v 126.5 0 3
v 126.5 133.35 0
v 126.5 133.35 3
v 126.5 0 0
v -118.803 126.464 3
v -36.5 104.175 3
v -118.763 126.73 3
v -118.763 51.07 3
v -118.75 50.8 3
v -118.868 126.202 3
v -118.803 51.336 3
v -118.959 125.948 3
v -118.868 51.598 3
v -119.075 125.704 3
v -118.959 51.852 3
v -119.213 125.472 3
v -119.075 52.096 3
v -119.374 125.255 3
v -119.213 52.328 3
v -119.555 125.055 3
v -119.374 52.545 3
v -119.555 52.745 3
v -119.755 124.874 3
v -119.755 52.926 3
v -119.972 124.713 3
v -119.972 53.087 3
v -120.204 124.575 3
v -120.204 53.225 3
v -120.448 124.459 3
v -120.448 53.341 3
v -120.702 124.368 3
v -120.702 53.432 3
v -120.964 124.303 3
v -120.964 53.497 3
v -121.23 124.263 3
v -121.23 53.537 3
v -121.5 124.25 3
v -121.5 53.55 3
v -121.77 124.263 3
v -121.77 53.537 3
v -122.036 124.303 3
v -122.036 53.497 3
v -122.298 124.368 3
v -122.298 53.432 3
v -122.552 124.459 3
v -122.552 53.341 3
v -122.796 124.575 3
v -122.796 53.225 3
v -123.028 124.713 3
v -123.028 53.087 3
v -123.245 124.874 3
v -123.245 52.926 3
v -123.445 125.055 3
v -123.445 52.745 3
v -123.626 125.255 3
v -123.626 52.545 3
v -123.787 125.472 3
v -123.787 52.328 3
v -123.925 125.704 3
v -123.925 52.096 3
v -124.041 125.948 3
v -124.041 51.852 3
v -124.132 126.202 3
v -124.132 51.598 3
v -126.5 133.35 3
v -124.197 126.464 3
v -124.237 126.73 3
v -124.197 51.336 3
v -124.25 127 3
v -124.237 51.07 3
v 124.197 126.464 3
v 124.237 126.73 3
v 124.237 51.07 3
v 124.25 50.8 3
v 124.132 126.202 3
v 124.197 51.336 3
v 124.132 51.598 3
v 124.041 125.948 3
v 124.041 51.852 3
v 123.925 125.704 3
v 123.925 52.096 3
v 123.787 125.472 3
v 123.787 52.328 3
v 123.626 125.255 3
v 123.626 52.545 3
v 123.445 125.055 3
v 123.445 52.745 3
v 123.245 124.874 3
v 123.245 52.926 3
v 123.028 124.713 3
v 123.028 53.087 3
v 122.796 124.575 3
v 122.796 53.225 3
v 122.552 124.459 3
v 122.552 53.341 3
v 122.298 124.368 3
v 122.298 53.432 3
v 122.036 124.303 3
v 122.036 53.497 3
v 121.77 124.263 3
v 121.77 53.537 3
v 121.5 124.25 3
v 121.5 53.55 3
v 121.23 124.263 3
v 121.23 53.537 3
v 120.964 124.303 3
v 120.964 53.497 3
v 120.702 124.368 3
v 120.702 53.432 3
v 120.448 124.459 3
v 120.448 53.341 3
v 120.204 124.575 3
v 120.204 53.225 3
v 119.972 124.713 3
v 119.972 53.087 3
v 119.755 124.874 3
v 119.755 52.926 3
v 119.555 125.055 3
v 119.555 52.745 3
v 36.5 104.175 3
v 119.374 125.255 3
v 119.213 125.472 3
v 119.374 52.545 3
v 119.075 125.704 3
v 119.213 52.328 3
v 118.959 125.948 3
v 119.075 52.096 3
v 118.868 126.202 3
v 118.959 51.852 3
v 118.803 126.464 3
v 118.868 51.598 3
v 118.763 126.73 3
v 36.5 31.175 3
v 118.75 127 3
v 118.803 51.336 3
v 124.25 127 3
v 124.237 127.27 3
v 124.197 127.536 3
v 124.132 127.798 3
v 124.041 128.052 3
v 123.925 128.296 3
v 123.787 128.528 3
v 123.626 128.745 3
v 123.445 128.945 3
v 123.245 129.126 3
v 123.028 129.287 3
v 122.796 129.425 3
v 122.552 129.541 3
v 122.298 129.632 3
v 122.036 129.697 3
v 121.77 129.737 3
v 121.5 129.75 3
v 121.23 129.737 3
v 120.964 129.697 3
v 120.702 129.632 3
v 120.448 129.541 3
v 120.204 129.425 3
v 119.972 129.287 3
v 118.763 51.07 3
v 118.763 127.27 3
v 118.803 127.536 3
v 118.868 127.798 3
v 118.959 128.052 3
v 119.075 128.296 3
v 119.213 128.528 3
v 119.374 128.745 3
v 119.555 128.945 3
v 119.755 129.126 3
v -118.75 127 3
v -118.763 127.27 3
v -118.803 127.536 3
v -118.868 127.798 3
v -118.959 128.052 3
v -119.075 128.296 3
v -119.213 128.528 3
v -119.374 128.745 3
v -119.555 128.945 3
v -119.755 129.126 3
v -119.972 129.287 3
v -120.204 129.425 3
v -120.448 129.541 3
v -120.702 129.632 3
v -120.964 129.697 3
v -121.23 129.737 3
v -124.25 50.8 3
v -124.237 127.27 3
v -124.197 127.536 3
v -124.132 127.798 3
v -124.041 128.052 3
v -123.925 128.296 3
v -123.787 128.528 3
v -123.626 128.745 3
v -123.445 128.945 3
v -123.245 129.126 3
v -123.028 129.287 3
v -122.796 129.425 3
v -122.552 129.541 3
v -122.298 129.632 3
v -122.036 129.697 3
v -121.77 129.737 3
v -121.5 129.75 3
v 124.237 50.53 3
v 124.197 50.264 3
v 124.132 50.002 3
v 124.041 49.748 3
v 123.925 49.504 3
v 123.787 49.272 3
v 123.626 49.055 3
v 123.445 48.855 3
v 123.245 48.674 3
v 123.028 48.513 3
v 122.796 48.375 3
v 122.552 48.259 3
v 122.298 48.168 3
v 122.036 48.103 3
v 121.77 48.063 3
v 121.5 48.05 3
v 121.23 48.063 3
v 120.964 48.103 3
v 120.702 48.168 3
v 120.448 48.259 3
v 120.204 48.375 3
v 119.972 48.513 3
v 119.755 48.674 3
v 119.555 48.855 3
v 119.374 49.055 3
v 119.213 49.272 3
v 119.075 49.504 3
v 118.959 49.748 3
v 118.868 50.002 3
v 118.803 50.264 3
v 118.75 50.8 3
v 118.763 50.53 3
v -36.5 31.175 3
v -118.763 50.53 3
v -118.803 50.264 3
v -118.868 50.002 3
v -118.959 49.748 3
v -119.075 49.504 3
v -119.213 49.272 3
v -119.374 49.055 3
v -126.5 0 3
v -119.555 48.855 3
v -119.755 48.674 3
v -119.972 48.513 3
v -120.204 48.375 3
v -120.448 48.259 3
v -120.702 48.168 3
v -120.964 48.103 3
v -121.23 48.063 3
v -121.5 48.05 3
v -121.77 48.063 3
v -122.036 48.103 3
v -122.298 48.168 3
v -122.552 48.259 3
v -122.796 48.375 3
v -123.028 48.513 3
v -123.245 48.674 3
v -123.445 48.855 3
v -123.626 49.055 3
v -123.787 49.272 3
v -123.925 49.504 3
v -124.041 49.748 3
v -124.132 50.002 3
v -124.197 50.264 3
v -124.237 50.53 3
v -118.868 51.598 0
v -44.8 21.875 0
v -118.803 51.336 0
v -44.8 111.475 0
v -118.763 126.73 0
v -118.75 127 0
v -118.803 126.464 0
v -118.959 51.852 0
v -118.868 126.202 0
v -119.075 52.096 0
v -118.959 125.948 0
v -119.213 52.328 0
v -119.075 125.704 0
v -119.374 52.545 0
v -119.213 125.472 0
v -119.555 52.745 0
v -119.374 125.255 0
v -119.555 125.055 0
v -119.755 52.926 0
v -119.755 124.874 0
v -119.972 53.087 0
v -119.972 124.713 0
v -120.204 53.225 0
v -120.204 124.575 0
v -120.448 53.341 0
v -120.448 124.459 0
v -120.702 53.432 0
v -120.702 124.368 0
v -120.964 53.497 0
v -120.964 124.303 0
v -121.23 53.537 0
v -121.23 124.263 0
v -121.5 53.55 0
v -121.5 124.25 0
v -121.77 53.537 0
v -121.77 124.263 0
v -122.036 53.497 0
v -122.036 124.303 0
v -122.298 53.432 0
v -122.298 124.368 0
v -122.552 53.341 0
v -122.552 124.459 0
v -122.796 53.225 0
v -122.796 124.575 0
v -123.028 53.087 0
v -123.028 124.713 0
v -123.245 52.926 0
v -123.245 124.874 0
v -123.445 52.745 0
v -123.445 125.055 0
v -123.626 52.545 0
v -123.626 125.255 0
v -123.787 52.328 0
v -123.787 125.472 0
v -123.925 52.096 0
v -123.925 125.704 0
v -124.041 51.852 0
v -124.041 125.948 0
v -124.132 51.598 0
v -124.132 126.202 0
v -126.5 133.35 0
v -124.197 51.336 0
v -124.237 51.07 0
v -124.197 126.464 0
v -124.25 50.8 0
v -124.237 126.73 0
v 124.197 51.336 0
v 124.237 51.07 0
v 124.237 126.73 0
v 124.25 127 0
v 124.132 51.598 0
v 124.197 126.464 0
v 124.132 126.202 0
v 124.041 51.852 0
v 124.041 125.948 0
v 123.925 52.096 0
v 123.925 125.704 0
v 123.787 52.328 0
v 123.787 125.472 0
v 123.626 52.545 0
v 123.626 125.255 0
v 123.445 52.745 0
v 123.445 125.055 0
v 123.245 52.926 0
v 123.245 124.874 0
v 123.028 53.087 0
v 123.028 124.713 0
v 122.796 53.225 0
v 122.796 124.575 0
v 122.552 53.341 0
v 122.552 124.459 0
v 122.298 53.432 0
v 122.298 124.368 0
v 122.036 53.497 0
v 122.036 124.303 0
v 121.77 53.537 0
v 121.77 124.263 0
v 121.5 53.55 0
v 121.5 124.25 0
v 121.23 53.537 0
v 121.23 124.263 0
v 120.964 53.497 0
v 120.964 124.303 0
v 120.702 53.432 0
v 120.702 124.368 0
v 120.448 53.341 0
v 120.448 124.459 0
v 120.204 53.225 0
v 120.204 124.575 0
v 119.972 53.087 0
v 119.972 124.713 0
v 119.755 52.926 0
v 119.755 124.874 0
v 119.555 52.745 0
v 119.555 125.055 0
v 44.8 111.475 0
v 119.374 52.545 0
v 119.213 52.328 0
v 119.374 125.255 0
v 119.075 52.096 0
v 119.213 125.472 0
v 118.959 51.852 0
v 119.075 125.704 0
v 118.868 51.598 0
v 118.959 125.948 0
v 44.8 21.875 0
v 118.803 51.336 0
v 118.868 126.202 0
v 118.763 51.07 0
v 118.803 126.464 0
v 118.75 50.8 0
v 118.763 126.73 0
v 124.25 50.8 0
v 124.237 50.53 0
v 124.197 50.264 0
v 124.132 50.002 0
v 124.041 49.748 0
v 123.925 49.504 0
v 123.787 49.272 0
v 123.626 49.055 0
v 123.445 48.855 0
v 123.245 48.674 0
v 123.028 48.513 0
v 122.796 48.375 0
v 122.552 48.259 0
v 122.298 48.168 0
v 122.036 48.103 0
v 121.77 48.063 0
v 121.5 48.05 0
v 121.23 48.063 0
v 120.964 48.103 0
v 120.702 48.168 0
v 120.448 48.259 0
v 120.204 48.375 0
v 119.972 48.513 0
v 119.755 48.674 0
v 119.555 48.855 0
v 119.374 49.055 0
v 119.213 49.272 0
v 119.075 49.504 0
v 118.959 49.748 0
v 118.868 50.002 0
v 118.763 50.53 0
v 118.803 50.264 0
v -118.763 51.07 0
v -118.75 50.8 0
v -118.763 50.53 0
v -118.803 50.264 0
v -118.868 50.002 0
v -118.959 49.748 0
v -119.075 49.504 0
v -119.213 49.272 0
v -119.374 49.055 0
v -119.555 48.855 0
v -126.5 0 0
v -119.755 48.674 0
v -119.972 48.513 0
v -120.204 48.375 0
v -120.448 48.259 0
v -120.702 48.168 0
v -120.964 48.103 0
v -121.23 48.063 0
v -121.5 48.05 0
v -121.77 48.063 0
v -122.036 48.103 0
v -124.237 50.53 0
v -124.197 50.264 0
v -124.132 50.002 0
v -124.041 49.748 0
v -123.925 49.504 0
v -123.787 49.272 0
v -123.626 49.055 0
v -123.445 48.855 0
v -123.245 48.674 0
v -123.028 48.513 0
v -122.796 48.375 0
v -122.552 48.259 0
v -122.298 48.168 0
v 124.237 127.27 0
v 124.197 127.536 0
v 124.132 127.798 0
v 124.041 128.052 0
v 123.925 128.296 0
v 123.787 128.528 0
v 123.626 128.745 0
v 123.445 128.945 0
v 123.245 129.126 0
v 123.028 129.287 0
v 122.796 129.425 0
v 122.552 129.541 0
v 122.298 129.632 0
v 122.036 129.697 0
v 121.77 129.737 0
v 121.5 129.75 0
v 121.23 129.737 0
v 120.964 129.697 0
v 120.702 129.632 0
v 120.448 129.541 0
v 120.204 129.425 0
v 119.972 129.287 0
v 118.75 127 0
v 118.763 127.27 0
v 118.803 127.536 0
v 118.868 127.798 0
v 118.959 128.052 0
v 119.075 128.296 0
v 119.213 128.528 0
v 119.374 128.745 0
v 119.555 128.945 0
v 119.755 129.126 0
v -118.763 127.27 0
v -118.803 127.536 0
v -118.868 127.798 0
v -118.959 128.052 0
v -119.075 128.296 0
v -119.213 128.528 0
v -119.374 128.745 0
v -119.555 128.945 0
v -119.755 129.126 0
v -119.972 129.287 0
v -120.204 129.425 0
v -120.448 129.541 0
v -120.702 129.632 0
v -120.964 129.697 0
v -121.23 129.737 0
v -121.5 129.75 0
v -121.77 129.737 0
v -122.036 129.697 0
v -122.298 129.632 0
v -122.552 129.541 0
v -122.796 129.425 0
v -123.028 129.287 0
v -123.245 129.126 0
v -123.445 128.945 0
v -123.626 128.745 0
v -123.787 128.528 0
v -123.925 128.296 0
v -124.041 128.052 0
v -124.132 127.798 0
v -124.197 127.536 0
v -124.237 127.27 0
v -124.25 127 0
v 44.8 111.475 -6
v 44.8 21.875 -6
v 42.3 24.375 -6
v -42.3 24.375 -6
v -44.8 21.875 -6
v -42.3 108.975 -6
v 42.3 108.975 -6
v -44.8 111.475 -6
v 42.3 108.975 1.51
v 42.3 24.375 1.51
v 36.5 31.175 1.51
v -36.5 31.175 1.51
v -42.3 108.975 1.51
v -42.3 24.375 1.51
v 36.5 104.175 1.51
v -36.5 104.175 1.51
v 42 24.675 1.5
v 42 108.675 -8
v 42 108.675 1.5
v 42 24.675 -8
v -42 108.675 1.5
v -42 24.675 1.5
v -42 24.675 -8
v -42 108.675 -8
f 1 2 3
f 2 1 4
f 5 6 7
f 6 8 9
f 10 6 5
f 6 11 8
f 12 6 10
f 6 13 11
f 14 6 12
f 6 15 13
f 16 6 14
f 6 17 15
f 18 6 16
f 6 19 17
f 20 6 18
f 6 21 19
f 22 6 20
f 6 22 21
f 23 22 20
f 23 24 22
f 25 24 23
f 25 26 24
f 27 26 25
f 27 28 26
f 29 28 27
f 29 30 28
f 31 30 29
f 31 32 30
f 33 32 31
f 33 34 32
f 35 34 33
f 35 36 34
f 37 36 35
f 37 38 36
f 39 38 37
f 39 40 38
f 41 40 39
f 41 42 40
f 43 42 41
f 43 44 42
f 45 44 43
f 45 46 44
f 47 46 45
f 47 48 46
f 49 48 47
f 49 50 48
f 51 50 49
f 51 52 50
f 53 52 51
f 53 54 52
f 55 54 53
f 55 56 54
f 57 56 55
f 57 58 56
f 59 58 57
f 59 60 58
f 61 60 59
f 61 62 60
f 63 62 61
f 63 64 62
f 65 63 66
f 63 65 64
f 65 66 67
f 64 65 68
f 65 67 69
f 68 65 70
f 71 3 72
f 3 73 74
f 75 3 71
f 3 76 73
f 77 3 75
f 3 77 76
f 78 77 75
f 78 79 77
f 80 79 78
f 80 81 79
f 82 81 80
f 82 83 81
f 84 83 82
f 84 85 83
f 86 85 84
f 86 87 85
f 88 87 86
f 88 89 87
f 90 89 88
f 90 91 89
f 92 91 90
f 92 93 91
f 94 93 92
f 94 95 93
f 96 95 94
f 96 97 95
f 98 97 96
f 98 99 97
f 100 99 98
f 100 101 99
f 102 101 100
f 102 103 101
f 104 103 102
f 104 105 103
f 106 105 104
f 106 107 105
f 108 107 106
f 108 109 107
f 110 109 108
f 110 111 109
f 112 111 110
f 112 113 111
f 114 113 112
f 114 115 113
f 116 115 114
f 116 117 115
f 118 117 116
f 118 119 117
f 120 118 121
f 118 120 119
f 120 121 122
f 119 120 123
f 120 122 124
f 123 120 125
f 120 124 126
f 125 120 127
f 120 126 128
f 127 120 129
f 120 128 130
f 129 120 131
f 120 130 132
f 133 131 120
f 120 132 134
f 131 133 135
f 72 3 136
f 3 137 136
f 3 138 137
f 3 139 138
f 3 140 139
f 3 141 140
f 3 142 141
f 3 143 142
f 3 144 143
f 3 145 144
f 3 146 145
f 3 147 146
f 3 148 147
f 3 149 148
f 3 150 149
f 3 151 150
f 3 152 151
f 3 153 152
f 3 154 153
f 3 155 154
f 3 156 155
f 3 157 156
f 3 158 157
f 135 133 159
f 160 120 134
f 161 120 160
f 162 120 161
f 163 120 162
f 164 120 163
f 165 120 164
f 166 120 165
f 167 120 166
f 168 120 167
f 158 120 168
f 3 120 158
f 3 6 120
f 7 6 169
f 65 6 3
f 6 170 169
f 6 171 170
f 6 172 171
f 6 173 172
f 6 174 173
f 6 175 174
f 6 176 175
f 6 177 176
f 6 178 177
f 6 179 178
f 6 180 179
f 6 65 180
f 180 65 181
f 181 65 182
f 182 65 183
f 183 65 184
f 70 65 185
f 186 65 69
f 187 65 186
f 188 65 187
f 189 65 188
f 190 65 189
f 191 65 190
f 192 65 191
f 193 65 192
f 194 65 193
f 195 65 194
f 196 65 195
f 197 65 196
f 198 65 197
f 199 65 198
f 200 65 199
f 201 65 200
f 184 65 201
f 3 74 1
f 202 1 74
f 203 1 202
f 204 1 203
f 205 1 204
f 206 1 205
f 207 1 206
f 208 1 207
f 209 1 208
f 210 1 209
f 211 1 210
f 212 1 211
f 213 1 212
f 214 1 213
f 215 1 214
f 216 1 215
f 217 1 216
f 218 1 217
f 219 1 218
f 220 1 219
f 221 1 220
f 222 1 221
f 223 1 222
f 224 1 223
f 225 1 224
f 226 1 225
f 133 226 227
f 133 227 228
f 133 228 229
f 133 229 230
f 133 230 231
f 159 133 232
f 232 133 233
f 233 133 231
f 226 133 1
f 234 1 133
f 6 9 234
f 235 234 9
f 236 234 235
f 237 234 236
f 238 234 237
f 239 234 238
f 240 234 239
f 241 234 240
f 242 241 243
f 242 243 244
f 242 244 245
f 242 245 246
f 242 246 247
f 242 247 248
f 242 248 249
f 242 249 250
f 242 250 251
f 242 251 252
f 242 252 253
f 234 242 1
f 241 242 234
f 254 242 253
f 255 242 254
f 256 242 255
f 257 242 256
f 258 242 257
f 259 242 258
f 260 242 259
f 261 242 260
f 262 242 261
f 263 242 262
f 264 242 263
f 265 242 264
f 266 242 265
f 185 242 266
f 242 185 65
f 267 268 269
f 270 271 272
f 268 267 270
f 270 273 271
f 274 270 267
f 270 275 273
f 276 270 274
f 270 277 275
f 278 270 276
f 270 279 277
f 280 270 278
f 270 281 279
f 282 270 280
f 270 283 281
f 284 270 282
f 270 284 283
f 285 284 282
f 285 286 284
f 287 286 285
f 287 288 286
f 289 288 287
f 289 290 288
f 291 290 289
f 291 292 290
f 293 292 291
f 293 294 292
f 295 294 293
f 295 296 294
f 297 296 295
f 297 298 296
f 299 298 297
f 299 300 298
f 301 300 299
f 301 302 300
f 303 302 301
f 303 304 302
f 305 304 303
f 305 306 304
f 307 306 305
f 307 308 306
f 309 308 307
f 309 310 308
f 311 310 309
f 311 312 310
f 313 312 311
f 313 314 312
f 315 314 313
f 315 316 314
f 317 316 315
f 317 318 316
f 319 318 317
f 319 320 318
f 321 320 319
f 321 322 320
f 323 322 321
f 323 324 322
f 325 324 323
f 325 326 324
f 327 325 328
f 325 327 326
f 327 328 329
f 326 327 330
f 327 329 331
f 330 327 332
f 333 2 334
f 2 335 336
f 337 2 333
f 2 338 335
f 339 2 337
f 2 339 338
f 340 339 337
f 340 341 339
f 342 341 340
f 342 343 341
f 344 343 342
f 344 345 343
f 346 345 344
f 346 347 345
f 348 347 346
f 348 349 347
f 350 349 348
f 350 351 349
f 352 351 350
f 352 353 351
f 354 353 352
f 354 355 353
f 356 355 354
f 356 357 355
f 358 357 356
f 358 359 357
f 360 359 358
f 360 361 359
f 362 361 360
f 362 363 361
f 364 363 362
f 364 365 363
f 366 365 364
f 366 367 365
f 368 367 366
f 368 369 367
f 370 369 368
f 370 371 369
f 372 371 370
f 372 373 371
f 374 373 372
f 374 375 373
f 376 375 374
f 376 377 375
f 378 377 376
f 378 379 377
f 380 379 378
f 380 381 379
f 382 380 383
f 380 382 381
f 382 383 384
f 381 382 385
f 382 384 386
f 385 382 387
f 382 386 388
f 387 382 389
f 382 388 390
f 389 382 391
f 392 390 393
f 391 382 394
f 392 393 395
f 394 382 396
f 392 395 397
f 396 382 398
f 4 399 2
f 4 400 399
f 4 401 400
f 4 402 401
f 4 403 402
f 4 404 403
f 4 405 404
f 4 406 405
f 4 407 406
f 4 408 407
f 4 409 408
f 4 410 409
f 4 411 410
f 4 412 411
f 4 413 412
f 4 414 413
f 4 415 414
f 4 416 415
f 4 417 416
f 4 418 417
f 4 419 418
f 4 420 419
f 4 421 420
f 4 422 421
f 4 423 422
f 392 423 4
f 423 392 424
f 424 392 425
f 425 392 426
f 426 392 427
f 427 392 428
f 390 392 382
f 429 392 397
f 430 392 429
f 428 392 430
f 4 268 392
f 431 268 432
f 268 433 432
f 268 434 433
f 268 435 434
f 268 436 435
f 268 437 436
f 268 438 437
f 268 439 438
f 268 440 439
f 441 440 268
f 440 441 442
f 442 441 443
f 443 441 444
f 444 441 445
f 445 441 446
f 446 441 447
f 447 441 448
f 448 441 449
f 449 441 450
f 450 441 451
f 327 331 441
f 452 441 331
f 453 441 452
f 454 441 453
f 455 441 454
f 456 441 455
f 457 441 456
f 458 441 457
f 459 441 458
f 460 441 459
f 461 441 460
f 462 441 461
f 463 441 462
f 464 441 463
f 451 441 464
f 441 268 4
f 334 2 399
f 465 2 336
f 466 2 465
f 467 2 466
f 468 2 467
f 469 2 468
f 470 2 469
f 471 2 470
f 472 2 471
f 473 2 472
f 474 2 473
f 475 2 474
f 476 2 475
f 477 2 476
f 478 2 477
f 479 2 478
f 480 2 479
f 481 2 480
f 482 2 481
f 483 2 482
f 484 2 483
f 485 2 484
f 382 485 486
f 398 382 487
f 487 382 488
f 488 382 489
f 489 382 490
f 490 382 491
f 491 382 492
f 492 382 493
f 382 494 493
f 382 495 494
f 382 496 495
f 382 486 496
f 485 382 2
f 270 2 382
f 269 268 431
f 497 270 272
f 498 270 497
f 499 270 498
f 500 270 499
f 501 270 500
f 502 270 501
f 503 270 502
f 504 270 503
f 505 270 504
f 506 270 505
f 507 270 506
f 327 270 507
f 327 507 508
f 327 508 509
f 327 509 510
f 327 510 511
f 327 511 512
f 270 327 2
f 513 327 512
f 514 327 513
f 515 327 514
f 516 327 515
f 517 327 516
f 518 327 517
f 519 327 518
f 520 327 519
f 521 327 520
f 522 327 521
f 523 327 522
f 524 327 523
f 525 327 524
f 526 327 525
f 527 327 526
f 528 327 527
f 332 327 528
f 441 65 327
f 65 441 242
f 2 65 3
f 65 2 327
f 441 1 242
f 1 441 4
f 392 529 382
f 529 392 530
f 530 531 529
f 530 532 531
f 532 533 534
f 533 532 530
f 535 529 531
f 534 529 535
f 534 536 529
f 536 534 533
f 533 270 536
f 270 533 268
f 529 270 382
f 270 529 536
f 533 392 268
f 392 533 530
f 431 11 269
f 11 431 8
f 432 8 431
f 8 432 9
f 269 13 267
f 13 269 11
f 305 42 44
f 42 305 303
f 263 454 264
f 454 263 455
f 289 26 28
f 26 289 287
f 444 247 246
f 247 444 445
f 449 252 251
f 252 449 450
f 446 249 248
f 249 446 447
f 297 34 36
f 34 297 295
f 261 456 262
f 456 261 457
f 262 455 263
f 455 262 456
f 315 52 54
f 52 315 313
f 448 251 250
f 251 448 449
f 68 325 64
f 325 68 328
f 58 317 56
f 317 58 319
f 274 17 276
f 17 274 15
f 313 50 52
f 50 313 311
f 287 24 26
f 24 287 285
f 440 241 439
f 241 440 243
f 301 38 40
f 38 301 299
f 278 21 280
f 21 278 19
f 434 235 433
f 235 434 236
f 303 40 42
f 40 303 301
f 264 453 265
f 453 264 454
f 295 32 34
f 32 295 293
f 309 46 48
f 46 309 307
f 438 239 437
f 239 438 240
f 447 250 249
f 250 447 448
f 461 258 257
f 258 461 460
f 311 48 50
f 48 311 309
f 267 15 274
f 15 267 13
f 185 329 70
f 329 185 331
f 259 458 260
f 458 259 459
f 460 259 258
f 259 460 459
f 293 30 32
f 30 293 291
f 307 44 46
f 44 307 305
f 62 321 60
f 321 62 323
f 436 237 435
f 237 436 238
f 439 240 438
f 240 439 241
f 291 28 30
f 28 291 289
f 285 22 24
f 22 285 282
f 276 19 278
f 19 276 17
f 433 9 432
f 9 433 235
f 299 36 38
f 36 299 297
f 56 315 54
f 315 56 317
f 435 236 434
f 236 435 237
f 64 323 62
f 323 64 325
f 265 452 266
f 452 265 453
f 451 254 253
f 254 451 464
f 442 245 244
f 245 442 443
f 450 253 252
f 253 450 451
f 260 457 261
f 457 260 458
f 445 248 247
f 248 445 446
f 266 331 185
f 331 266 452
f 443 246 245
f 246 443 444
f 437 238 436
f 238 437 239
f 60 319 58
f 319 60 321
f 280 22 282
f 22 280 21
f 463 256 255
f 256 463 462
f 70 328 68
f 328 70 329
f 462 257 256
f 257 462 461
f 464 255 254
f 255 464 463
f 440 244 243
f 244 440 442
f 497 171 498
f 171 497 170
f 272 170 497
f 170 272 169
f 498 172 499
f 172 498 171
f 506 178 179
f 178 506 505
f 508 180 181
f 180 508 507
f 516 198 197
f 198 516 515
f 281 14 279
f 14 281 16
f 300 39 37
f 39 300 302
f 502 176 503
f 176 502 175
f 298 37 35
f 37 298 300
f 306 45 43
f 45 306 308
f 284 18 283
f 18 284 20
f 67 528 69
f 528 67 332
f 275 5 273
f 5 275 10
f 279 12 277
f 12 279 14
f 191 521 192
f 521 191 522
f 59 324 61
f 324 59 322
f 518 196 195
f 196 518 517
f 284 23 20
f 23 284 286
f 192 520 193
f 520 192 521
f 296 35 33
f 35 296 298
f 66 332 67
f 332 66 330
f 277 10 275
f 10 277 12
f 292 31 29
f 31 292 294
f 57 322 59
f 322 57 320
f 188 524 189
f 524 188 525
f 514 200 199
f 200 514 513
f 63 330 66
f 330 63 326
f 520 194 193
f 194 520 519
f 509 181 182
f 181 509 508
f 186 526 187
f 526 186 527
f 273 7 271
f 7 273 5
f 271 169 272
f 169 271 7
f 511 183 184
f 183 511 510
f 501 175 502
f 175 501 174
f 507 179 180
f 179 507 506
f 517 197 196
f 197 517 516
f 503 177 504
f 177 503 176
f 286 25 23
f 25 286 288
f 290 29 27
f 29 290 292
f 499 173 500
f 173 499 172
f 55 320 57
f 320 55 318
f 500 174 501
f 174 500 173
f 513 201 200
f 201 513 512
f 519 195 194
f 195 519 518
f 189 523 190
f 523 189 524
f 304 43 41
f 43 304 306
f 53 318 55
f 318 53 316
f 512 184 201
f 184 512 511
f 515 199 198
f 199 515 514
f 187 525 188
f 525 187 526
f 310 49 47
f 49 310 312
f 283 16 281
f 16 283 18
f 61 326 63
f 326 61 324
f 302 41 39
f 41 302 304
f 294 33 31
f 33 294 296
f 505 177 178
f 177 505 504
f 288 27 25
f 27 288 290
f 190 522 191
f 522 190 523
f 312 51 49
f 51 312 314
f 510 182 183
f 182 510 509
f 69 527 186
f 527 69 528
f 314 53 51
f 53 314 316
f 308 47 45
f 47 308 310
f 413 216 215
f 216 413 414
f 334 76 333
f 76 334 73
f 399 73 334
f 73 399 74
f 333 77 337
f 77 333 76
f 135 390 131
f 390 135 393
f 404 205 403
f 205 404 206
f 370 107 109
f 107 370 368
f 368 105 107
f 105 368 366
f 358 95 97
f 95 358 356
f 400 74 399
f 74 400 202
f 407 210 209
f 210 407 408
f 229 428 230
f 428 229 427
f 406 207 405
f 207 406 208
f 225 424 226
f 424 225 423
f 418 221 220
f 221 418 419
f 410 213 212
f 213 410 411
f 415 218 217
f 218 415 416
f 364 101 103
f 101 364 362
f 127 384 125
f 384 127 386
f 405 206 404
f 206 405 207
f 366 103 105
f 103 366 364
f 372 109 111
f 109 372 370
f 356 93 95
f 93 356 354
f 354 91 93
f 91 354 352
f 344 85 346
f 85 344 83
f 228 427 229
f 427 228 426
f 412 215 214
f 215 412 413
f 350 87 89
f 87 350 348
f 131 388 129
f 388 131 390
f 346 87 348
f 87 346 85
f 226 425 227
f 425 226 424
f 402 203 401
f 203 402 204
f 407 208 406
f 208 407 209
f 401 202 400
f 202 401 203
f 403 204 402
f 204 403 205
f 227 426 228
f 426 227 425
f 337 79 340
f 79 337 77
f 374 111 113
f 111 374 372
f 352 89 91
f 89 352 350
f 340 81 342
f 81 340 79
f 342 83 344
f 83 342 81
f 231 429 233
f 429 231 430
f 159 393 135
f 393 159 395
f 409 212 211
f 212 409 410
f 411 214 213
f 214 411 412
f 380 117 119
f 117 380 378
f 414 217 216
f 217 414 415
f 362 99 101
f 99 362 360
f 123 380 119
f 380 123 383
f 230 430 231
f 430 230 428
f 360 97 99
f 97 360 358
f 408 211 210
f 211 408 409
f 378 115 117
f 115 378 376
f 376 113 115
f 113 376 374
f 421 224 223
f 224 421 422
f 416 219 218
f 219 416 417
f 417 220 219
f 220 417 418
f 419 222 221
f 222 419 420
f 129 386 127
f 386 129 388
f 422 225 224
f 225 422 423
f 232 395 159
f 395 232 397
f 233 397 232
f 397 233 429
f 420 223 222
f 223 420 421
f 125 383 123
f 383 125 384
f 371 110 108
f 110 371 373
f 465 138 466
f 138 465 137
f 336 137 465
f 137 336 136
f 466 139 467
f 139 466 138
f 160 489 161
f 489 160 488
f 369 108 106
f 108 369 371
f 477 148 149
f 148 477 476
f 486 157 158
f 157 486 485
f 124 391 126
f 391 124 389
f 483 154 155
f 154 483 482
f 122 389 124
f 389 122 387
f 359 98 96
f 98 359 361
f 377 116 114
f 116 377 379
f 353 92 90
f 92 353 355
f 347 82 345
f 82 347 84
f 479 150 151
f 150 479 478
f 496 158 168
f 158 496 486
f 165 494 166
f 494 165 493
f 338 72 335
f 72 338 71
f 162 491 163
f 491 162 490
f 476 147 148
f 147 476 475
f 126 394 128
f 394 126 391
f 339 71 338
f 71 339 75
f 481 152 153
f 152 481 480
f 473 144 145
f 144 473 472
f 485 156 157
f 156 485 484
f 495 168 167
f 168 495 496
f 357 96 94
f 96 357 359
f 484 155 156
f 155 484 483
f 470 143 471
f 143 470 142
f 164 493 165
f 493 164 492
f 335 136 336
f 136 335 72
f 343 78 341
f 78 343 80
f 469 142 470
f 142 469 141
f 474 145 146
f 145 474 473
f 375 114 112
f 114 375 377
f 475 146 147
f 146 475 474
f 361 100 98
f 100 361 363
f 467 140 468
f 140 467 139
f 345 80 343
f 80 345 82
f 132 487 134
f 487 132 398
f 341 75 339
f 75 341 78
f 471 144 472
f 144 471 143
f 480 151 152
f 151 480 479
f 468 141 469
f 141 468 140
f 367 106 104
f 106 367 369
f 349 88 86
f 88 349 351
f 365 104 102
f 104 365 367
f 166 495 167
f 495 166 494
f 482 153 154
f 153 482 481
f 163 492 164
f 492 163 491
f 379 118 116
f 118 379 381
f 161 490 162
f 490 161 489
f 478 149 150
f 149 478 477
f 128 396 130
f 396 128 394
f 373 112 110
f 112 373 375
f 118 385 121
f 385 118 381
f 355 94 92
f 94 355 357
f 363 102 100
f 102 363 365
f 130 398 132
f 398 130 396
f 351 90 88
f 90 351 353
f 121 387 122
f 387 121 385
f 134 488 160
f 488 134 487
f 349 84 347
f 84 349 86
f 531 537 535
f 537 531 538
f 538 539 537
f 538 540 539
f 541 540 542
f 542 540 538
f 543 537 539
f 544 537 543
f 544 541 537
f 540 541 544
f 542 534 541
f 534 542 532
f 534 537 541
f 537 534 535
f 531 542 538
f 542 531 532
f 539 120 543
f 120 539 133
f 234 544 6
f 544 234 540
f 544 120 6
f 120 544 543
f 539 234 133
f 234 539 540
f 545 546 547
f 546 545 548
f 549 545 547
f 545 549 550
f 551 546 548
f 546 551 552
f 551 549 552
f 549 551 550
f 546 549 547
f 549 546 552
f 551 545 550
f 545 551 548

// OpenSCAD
// =============================================================================
// CONSOLE10 — HyperPixel 4.0 Square Faceplate  v0.1  (3 mm flat panel, 3U)
//
// For the Pimoroni HyperPixel 4.0 SQUARE *Touch* (720x720 IPS, capacitive).
// The Pi is OFF-PANEL (connected by ribbon) — this plate holds the DISPLAY ONLY.
//
// DESIGN: uniform 3 mm flat faceplate that bolts to the cheek SLANT inserts
// (same family as Console10_display_faceplate / _lcd_simple_faceplate). The
// square display drops into a RECESSED FRONT POCKET from the back; a front LIP
// frames the active area and overlaps the ~6 mm black bezel margin to capture
// the glass. A rear LOCATING COLLAR (open square tube) surrounds the board edges
// behind the plate to locate it and host retention (clips/screws — v0.2).
//
// Local frame (also the print orientation):
//   X = plate width,  Y = up the plate (= up the cheek slant),  Z = thickness.
//   +Z = front / operator side.  Front face at Z = plate_t, back at Z = 0.
//
// DIMENSIONS — CONFIRMED from the Pimoroni HyperPixel 4.0 Square mechanical
// drawing (2026-06-11). Items marked [CAL] still want a caliper pass before a
// final print.
//   hp_board   84.0   board W=H (touch; non-touch is 75x80). CONFIRMED
//   hp_active  72.0    active display W=H. CONFIRMED
//   hp_depth   9.5     glass front -> back of header. CONFIRMED
//   hp_rim_t   2.6     glass+PCB edge the lip/collar bears on. [CAL]
//   Bezel ~5.5 L/R, 4.5 top, 6.5 bottom (approx) -> active is NOT centered; it
//   sits ~1 mm toward the GPIO-header edge (see active_off_y). [CAL]
//   HAT holes: 58 x 49 grid, upper-left at (4.0, 6.5) from the board top-left,
//   M2.5 (forum reply, not datasheet) [CAL]. CONFIRMED CATCH: the right-hand
//   hole column lands INSIDE the 72 active glass -> no front bolt -> rear
//   retention (v0.2). The official GrabCAD/STEP link is dead as of 2026.
// =============================================================================

// ---------- module geometry the plate must mate to ----------
panel_width   = 253;      // 10" mini-rack width
cheek_thick   = 10;
slant_angle   = 30;       // front slant, degrees from vertical
U             = 44.45;    // 1U, mm
interior_half = panel_width/2 - cheek_thick;   // 116.5
cheek_ctr_x   = interior_half + cheek_thick/2; // 121.5 (slant insert X centerline)

// ---------- flat plate ----------
n_u      = 3;             // 3U faceplate
plate_w  = 253;           // sides flush with the cheek outer faces (+/-126.5)
plate_h  = n_u * U;       // 133.35
plate_t  = 3;             // uniform panel thickness

// ---------- HyperPixel 4.0 Square Touch — CONFIRMED (Pimoroni mech drawing) ---
hp_board  = 84.0;         // board W = H (square, touch). CONFIRMED
hp_active = 72.0;         // active display W = H. CONFIRMED
hp_depth  = 9.5;          // glass front -> back of header. CONFIRMED
hp_rim_t  = 4.6;          // glass+PCB rim thickness under the lip. MEASURED 4.6

// Asymmetric bezel -> the active is offset toward the header edge. SIGN below
// assumes the GPIO-header edge is at the TOP of the plate (header-up); negate
// active_off_y if you mount it header-down.
bezel_top    = 4.5;       // [CAL]
bezel_bottom = 6.5;       // [CAL]
active_off_y = (bezel_bottom - bezel_top) / 2;   // +1.0 mm toward header  [CAL]

// ---------- HAT mounting holes — DOCUMENTED ONLY (not cut; under the glass) ---
// 58 x 49 grid; upper-left hole 4.0 from left / 6.5 from top of the 84 board.
hole_ul = [4.0, 6.5];     // upper-left hole from board top-left, M2.5  [CAL]
hole_dx = 58;  hole_dy = 49;
hole_xs = [-hp_board/2 + hole_ul[0], -hp_board/2 + hole_ul[0] + hole_dx]; // [-38, 20]
hole_ys = [ hp_board/2 - hole_ul[1],  hp_board/2 - hole_ul[1] - hole_dy]; // [35.5, -13.5]
hole_d  = 2.7;            // M2.5 clearance (reference marker only)

// ---------- front frame (pocket + lip + window) ----------
board_clr  = 0.3;                      // per-side clearance, board into the pocket
pocket     = hp_board + 2*board_clr;   // 84.6 — board cavity W = H
win_reveal = 0.5;                      // bezel reveal per side around the active
window     = hp_active + 2*win_reveal; // 73.0 — viewing aperture (frames active)
lip_t      = 1.5;                      // front frame thickness over the bezel

// ---------- rear locating collar (open square tube behind the plate) ----------
collar_h    = 6;          // wall height behind the plate (locates the board edges)
collar_wall = 2.5;        // wall thickness
collar_out  = pocket + 2*collar_wall;  // 89.6 outer

// ---------- v0.2 rear retention clips (reuse the print-TESTED Stream Deck Mini
// pattern). Flex fingers cut from the collar SIDE walls; an inward hook snaps
// over the board's MEASURED 4.6 mm-thick back edge to press the glass into the
// lip. SIDE edges only -> clears the GPIO header (top edge) + the FPC corner.
// NOTE: short fingers (collar only 6 mm) -> stiff snap; fit-test coupon first.
retention   = true;
clip_w      = 8;          // flex-finger width along the edge (Y)
clip_slot   = 1.2;        // slot width isolating each finger (flex gap)
hook_d      = 1.3;        // hook overhang past the cavity wall (~1.0 mm board grab)
hook_h      = 1.5;        // hook catch height (Z)
clip_ys_off = [-20, 20];  // finger Y = cy + these; avoid header/FPC  [CHECK FPC]

// ---------- placement ----------
cx = 0;
cy = plate_h/2;           // centered vertically on the 3U plate

// ---------- slant-insert mount holes (perpendicular through the flat plate) ----
mount_y      = [50.80, 127.00];
m10_32_clear = 5.5;       // 10-32 clearance

show_screen   = true;     // include the mock display in the fit-check
show_holes    = false;    // red markers at the 4 HAT holes (shows them vs glass)
show_on_slant = false;    // true = tilt the flat stack onto the 30 deg slant
floor_t       = 6;        // bottom-panel slab thickness (for the slant placement)

$fn = 64;

echo(str("HYPERPIXEL-SQ FACEPLATE v0.1  ", plate_w, " x ", plate_h, " (", n_u,
         "U) t", plate_t, " | board ", hp_board, " active ", hp_active,
         " | pocket ", pocket, " window ", window, " (reveal ", win_reveal,
         "/side) | active_off_y ", active_off_y, " | lip ", lip_t, " @ y=", cy));

// Z planes
seat_z = plate_t - lip_t;     // 1.5 — board glass front seats here (lip back face)

// =============================================================================
// PANEL — flat 3 mm slab + rear locating collar, minus the recessed pocket,
// the front viewing window, and the slant mount holes.
// =============================================================================
module panel() {
    difference() {
        union() {
            // the slab (front face at Z=plate_t, back at Z=0)
            translate([-plate_w/2, 0, 0]) cube([plate_w, plate_h, plate_t]);

            // rear locating collar: solid block (the pocket cut hollows it out)
            translate([cx, cy, -collar_h/2])
                cube([collar_out, collar_out, collar_h], center = true);
        }

        // --- recessed pocket: board cavity from Z=-collar_h up to seat_z ---
        // (carves the collar interior AND the plate's rear recess in one cut)
        pocket_d = seat_z + collar_h;                  // 1.5 + 6 = 7.5
        translate([cx, cy, (seat_z - collar_h)/2])     // center between -collar_h and seat_z
            cube([pocket, pocket, pocket_d + 0.02], center = true);

        // --- front viewing window through the lip (tracks the offset active) ---
        translate([cx, cy + active_off_y, plate_t - lip_t/2])
            cube([window, window, lip_t + 0.1], center = true);

        // --- slant-insert mount screws — 2 per side, straight through ---
        for (sx = [-cheek_ctr_x, cheek_ctr_x])
            for (y = mount_y)
                translate([sx, y, -collar_h - 1])
                    cylinder(d = m10_32_clear, h = plate_t + collar_h + 2);
    }
}

// =============================================================================
// MOCK SCREEN — fit-check only (not printed). Board block from the seated glass
// plane back by hp_depth, plus a glossy active face just behind the glass.
// =============================================================================
module screen_mock() {
    color("DimGray")
        translate([cx, cy, seat_z - hp_depth/2])
            cube([hp_board, hp_board, hp_depth], center = true);
    color("RoyalBlue")
        translate([cx, cy + active_off_y, seat_z - 0.55])
            cube([hp_active, hp_active, 0.8], center = true);
}

// =============================================================================
// HOLE MARKERS — fit-check only (not printed). Red discs on the glass plane at
// the 4 HAT holes, so a front render shows which fall INSIDE the active area.
// =============================================================================
module hole_markers() {
    color("Red")
    for (hx = hole_xs)
        for (hy = hole_ys)
            translate([cx + hx, cy + hy, seat_z + 0.2])
                cylinder(d = hole_d, h = 0.6, center = true);
}

// =============================================================================
// STACK — panel + (optional) mock screen, in the local flat frame.
// =============================================================================
module hp_stack() {
    color("Gainsboro") panel();
    if (show_screen) screen_mock();
    if (show_holes)  hole_markers();
}

// Fit-check: lay the flat stack onto the 30 deg slant (see display faceplate).
module hp_on_slant() {
    translate([0, 0, floor_t])
        rotate([90 - slant_angle, 0, 0])
            hp_stack();
}

// Public entry the module assembly can call:
module hyperpixel_sq_faceplate_on_slant() { hp_on_slant(); }

if (show_on_slant) hp_on_slant();
else               hp_stack();
